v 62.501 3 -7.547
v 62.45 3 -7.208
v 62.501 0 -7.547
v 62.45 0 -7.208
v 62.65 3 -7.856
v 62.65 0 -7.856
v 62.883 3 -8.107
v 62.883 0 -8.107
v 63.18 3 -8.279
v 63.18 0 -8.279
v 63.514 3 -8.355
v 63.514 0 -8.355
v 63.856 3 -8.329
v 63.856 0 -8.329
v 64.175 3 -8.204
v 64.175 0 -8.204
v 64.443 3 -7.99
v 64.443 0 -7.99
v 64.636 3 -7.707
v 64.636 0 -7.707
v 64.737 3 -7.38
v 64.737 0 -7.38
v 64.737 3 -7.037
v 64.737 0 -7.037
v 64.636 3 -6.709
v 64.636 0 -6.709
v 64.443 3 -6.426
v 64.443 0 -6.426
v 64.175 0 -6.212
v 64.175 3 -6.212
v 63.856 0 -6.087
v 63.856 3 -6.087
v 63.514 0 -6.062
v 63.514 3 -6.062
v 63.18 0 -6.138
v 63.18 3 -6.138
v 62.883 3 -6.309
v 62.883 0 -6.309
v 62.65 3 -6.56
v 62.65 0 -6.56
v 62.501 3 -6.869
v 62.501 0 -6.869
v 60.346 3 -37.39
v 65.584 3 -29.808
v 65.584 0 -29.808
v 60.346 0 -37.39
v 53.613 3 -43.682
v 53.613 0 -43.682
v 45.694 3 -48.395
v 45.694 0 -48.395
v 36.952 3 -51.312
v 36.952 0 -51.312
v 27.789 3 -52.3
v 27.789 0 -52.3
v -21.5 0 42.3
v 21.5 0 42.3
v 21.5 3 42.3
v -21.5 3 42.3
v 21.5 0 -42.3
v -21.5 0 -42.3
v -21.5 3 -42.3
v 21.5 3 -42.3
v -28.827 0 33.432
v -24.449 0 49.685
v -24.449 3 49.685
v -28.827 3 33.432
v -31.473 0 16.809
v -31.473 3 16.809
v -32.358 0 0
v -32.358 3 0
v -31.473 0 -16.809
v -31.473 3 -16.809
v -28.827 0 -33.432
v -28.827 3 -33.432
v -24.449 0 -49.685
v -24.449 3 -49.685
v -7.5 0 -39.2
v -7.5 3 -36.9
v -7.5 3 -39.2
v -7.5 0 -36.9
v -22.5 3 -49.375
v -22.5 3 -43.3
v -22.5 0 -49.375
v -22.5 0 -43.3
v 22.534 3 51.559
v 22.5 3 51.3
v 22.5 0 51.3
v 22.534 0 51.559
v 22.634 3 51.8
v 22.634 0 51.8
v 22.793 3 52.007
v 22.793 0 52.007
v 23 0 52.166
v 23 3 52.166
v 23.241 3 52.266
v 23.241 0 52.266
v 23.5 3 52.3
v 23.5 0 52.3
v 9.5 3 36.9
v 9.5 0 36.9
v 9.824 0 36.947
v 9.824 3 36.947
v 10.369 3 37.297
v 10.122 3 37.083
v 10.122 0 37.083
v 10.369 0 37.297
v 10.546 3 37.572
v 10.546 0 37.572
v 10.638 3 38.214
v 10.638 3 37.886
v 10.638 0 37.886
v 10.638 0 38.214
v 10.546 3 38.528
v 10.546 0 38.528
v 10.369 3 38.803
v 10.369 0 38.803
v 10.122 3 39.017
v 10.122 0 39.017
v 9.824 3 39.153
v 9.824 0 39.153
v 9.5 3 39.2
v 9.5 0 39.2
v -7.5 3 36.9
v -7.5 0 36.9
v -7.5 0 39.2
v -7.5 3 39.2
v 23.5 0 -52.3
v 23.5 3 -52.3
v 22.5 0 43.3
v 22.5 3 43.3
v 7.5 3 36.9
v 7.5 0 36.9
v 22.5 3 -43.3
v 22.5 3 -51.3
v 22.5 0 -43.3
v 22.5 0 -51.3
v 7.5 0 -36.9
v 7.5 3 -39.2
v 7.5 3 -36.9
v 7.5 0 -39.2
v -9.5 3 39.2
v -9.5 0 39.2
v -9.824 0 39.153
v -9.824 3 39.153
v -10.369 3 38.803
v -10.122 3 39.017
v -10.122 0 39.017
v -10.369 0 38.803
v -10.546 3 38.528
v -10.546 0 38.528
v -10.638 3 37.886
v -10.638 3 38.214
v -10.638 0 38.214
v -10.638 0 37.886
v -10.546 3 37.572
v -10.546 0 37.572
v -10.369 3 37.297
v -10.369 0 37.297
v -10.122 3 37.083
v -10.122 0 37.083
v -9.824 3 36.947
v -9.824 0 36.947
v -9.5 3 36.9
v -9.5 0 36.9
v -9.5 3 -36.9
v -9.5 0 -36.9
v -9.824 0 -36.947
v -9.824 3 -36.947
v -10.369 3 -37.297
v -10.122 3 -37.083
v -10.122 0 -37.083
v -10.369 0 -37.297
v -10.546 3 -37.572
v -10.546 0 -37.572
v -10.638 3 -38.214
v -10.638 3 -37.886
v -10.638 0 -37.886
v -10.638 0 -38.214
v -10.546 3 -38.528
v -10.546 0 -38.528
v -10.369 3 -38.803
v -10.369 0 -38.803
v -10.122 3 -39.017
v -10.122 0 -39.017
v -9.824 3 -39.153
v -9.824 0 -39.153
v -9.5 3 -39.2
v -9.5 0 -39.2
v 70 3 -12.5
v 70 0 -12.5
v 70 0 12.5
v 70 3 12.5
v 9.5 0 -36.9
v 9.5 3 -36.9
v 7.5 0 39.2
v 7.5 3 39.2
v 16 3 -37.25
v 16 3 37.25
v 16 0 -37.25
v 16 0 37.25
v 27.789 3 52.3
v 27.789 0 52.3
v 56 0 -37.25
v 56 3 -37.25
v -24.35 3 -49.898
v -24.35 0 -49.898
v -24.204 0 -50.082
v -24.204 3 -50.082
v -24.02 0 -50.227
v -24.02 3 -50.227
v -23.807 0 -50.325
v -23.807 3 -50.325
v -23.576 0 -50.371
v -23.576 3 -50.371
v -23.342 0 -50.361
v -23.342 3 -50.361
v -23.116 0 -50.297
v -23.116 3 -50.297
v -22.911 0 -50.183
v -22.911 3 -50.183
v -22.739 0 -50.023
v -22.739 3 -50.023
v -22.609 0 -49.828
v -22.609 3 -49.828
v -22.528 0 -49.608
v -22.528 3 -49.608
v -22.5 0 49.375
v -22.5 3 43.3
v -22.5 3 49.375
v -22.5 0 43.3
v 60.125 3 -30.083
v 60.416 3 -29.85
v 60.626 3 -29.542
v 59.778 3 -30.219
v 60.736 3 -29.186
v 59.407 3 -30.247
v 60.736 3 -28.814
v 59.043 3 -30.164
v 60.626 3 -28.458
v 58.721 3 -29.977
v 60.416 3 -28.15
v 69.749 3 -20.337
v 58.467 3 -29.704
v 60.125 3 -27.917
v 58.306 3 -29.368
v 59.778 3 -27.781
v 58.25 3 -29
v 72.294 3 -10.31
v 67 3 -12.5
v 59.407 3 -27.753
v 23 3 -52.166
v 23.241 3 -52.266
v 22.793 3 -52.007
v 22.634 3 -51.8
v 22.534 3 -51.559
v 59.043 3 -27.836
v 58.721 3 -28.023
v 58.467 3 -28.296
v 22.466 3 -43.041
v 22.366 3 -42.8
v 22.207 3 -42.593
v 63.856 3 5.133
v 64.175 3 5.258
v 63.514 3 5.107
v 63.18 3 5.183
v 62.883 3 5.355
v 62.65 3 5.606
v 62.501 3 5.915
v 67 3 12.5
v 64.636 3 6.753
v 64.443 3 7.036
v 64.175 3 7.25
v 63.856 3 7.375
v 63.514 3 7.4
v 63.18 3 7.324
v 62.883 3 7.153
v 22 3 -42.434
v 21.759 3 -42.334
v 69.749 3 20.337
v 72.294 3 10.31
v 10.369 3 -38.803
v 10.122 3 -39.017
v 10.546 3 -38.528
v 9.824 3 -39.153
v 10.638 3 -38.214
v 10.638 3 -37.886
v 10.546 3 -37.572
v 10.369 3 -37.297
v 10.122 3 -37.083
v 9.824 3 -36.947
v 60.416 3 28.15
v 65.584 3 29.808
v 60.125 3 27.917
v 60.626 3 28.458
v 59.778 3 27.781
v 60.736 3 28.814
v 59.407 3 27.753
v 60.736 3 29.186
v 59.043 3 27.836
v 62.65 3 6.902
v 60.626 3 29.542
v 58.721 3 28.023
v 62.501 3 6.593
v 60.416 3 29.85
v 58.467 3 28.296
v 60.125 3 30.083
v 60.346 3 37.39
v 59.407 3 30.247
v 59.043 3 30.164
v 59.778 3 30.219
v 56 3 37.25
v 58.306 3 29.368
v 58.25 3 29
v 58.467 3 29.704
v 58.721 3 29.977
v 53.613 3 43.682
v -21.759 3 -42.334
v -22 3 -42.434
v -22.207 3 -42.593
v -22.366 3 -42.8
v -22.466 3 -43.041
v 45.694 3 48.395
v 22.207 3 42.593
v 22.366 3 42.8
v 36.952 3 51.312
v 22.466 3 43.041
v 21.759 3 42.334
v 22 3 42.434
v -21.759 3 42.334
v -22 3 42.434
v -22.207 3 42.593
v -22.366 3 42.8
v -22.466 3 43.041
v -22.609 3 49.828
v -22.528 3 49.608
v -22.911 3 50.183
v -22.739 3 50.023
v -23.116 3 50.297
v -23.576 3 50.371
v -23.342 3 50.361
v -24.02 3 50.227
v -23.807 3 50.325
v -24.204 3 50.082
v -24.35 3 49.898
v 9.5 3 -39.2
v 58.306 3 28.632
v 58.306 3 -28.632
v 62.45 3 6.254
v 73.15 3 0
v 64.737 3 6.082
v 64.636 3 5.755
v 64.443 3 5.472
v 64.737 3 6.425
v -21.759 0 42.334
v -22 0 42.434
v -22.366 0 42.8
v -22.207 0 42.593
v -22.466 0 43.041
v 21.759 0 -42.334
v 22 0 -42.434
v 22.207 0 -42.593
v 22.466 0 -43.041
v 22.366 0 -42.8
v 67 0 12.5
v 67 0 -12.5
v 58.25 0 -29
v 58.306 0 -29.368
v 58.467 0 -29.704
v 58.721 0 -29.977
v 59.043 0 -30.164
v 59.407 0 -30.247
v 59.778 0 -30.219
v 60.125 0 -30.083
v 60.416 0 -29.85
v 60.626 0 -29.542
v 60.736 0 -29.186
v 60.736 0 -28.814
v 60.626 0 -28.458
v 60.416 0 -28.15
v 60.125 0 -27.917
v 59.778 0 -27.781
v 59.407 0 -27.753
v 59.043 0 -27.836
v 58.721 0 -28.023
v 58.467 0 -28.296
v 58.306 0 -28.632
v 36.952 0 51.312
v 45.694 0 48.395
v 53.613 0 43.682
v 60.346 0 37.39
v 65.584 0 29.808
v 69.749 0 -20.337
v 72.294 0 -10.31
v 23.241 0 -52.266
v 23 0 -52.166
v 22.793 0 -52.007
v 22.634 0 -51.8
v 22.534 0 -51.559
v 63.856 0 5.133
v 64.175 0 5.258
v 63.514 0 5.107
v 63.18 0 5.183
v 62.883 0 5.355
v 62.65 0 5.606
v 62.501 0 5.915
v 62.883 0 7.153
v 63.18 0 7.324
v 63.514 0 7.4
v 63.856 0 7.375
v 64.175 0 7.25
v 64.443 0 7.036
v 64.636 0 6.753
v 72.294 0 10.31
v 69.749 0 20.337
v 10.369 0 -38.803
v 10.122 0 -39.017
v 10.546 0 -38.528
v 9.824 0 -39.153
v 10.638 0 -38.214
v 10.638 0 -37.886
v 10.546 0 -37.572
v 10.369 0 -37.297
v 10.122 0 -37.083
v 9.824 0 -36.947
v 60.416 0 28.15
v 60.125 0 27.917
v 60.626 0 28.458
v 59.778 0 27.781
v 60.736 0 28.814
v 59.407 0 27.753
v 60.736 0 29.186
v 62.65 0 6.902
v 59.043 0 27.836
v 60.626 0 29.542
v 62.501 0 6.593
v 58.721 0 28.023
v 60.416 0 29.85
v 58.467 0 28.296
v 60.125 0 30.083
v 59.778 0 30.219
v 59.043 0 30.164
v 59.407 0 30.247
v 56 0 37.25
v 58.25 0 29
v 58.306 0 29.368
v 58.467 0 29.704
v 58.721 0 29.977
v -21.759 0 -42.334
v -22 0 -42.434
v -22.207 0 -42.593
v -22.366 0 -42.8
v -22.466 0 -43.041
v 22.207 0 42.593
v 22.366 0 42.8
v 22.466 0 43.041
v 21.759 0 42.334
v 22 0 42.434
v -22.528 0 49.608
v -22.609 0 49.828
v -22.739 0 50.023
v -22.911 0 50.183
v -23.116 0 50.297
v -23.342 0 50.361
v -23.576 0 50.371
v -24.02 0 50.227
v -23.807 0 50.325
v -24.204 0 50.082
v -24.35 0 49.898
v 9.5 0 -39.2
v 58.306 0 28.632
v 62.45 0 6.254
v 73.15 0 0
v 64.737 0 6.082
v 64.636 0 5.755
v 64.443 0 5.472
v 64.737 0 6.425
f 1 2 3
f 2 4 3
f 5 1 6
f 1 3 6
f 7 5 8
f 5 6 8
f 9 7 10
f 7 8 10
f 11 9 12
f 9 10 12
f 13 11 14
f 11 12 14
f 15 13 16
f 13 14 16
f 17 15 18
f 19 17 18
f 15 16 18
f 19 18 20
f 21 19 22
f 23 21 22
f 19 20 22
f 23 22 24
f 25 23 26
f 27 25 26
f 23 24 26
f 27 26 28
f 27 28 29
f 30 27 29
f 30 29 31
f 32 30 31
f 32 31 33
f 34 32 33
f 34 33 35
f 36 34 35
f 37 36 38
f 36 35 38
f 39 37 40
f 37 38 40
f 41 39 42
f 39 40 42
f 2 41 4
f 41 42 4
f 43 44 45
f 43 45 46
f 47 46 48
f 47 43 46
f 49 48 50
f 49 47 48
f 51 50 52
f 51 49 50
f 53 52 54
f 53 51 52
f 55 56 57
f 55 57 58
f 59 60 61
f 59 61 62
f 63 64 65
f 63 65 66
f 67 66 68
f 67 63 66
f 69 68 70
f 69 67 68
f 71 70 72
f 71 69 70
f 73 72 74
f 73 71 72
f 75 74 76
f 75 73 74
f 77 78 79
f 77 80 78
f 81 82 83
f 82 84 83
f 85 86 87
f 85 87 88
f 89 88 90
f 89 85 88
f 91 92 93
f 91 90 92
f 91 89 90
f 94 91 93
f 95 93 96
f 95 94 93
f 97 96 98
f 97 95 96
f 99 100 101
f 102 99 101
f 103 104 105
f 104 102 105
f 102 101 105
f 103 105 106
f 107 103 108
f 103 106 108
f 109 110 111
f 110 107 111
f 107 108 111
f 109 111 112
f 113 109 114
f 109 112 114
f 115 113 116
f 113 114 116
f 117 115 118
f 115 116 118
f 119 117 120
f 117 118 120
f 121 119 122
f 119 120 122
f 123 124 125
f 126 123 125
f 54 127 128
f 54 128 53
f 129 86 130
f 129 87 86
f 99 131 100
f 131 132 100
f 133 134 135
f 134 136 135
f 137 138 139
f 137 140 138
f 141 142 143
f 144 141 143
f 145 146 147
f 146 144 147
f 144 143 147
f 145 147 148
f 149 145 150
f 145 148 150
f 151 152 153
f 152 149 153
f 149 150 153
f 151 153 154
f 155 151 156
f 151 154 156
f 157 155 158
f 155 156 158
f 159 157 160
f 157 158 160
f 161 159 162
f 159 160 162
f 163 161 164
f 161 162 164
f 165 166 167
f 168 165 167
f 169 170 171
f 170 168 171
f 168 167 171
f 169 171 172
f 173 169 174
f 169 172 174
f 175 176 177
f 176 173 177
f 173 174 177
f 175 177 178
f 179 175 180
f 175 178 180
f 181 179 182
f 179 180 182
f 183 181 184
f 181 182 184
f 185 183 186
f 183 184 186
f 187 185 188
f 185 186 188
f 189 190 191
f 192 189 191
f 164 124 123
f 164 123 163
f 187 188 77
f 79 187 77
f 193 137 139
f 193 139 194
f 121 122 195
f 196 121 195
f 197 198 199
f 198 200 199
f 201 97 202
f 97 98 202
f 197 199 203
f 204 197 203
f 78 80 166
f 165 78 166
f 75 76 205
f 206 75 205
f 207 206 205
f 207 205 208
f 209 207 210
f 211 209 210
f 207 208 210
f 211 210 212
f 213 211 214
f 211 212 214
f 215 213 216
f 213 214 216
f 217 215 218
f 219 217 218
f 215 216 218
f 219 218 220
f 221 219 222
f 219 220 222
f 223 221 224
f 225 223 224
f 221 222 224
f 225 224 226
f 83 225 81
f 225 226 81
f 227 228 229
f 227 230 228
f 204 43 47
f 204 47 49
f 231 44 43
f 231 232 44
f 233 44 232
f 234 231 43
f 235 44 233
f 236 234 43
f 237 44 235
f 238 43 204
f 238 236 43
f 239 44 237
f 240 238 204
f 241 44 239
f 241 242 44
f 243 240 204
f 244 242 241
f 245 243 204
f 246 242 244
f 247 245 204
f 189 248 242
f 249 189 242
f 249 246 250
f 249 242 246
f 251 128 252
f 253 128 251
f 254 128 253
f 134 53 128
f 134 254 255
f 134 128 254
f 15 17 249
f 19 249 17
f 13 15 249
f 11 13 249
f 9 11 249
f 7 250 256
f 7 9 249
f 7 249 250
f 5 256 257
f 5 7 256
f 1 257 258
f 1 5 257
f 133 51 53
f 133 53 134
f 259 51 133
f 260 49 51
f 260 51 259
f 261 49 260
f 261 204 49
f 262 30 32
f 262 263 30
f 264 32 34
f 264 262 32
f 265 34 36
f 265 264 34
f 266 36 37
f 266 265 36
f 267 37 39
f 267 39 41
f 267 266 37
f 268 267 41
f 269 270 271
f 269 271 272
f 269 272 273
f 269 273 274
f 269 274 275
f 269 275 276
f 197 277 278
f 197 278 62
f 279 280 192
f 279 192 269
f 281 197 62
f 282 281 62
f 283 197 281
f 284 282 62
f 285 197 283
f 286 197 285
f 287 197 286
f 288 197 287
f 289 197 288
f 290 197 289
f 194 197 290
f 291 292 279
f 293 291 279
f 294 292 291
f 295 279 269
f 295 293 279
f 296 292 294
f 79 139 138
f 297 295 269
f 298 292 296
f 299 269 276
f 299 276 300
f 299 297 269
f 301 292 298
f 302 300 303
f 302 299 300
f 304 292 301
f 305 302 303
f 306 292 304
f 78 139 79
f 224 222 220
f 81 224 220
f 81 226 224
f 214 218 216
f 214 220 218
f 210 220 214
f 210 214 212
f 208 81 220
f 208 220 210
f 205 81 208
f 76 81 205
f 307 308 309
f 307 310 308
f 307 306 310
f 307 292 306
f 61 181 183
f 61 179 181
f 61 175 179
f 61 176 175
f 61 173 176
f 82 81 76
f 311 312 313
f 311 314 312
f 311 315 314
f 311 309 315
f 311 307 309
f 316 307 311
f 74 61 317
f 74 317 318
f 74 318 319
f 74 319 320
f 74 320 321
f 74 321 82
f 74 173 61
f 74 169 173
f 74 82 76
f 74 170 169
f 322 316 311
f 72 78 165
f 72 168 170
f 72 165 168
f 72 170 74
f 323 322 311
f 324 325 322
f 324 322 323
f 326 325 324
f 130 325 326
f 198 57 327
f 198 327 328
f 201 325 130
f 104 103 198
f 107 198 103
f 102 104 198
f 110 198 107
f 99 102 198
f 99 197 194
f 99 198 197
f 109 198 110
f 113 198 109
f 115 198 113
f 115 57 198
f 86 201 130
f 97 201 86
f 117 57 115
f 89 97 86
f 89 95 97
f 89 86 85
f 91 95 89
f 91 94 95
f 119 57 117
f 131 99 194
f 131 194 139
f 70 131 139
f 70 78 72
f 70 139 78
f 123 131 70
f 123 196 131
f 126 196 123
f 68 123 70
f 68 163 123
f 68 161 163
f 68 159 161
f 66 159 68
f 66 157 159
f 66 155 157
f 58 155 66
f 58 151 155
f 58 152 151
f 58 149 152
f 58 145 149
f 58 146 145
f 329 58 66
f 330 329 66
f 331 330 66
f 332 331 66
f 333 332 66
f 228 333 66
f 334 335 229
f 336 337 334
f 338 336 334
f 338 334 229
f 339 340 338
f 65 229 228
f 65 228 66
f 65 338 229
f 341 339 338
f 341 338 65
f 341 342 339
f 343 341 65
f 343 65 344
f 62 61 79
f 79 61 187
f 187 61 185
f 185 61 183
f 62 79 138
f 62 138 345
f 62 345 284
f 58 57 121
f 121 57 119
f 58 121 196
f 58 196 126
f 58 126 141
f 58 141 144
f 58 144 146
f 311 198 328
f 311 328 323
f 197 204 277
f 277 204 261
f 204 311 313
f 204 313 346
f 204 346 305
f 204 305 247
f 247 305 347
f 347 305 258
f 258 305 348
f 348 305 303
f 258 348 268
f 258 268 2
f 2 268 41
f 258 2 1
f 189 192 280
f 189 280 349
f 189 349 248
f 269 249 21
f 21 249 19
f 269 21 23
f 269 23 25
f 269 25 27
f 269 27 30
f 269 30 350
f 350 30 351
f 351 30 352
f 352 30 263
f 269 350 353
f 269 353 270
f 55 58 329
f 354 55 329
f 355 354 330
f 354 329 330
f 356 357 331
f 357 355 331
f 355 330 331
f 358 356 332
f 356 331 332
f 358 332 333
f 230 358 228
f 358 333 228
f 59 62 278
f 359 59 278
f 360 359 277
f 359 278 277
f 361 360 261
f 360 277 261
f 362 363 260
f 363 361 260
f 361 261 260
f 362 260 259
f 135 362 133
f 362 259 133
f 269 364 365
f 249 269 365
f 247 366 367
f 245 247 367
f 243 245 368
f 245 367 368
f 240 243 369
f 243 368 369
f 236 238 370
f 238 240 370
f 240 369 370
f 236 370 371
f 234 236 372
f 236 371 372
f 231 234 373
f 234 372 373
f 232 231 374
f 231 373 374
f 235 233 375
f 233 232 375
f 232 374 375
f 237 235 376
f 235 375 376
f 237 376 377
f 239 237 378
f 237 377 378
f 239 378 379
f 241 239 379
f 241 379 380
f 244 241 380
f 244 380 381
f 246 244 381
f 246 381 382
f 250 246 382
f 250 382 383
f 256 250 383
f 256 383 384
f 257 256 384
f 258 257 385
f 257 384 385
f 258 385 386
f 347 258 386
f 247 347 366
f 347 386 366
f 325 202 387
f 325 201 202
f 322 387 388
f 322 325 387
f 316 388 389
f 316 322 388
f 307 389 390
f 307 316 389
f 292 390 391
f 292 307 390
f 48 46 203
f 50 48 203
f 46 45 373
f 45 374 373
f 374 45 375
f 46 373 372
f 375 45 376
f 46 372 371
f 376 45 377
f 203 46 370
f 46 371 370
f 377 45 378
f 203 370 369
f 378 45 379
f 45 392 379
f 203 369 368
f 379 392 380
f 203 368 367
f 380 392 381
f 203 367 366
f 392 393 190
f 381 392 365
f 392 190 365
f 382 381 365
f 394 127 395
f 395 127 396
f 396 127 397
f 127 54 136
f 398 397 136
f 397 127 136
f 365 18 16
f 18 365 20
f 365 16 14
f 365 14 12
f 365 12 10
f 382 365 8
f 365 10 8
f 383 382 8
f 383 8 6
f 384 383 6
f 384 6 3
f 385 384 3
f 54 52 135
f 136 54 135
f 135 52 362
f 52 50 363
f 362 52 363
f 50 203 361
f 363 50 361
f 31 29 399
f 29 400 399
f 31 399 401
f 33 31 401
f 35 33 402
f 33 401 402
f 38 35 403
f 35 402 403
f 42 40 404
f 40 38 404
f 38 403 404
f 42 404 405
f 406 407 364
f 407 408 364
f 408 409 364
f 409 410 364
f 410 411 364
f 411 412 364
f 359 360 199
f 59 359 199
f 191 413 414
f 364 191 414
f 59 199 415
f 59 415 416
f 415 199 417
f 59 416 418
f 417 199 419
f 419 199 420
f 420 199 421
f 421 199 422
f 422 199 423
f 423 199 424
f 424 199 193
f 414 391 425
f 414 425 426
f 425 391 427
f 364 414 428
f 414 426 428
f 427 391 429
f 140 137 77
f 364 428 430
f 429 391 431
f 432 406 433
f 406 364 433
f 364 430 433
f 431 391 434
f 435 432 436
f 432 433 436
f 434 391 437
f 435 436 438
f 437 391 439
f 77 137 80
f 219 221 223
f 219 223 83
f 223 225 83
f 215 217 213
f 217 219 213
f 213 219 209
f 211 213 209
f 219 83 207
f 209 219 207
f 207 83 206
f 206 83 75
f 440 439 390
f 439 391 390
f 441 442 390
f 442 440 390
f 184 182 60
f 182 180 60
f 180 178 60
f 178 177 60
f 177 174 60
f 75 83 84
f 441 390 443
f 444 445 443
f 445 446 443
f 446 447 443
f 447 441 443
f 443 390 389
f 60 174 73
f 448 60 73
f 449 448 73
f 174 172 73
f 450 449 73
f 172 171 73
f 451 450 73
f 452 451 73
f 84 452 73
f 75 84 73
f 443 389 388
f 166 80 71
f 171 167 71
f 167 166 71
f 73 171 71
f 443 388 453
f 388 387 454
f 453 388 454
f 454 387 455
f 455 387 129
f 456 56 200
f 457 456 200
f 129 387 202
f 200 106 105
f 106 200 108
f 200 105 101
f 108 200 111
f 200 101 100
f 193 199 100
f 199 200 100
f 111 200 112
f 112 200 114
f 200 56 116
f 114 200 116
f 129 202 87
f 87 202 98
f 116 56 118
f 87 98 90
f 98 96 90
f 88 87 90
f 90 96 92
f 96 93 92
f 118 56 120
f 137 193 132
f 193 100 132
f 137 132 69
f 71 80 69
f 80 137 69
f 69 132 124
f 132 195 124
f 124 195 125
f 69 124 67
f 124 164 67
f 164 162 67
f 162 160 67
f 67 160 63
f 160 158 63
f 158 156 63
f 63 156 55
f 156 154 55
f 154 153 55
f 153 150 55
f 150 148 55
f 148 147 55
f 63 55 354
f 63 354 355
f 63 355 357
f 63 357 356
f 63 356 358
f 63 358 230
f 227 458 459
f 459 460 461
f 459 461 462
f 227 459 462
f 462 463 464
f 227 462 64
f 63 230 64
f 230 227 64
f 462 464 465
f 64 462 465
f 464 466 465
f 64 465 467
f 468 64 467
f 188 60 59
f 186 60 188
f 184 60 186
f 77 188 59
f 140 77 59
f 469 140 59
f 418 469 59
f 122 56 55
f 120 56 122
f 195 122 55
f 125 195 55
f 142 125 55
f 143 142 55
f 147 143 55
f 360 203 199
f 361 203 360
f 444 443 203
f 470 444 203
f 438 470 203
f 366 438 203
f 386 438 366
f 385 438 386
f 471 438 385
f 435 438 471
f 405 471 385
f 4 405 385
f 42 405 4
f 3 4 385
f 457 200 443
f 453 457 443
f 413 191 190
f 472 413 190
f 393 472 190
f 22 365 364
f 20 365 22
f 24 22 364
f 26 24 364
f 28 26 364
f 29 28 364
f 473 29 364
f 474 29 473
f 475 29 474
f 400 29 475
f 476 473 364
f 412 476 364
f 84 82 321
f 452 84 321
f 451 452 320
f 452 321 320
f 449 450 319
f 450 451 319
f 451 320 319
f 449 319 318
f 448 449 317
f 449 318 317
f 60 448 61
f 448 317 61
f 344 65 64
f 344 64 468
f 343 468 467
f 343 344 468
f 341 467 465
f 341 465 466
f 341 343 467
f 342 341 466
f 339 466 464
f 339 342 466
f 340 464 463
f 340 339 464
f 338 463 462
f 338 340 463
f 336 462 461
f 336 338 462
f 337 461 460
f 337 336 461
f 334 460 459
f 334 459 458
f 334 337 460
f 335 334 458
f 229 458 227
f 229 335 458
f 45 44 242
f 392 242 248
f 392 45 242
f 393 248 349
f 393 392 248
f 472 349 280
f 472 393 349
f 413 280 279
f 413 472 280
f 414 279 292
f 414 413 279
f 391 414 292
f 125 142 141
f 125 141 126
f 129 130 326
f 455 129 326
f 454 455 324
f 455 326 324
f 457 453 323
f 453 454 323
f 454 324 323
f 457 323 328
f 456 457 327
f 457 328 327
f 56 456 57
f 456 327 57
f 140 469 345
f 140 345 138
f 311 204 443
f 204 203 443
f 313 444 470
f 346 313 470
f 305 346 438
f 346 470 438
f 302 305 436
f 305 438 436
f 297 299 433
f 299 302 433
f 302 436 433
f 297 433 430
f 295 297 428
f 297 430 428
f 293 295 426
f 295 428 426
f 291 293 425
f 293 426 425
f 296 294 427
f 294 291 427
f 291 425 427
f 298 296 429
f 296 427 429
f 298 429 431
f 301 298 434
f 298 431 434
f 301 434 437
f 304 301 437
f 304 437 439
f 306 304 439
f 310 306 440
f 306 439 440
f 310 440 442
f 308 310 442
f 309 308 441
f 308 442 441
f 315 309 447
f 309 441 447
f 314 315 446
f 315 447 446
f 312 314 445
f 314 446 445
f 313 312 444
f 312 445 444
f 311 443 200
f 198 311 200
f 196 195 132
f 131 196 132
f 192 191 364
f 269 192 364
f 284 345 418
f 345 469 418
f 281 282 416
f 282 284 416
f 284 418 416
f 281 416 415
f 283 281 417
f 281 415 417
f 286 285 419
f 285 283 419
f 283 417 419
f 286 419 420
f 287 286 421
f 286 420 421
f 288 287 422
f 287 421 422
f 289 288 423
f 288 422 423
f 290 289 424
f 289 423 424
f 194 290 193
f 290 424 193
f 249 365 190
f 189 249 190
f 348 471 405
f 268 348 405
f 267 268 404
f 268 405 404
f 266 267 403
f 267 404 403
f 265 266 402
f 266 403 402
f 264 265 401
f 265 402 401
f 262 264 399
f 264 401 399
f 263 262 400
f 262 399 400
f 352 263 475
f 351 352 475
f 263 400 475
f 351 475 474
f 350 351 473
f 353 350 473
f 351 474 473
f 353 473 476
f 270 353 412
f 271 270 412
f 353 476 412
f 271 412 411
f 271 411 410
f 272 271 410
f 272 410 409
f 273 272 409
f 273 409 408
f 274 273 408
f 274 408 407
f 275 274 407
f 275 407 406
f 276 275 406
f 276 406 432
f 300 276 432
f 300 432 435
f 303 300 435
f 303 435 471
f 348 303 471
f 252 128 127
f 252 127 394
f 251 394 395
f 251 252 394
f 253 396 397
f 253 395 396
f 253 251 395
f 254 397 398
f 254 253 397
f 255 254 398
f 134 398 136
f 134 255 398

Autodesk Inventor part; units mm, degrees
ref_plane "YZ Plane" through (0, 0, 0) normal (1, 0, 0) x (0, 1, 0)
ref_plane "XZ Plane" through (0, 0, 0) normal (0, 1, 0) x (-1, 0, 0)
ref_plane "XY Plane" through (0, 0, 0) normal (0, 0, 1) x (1, 0, 0)
sketch "Boceto2" plane through (0, 0, 0) normal (0, 1, 0) x (-1, 0, 0)
  circle A0 centre (-10.65, 0) radius 62.5
  line L0 (-63, 32.5) -> (-63, -32.5)
  line L1 (-63, -32.5) -> (-33, -32.5)
  line L2 (-33, -32.5) -> (-33, 32.5)
  line L3 (-33, 32.5) -> (-63, 32.5)
  circle A1 centre (-59.5, -29) radius 1.25
  line L4 (0, 6.809) -> (0, -6.809)
  line L5 (10.65, 0) -> (-10.65, 0) construction
  circle A2 centre (-36.5, -29) radius 1.25
  circle A3 centre (-59.5, 29) radius 1.25
  circle A4 centre (-36.5, 29) radius 1.25
  line L6 (7.5, -42.3) -> (-7.5, -42.3)
  line L7 (-7.5, -42.3) -> (-7.5, -25)
  line L8 (-7.5, -25) -> (7.5, -25)
  line L9 (7.5, -25) -> (7.5, -42.3)
  arc A5 (9, -42.3) -> (9, -33.8) centre (9, -38.05) ccw
  line L10 (9, -42.3) -> (7.5, -42.3)
  line L11 (9, -33.8) -> (7.5, -33.8)
  arc A6 (9.5, -39.2) -> (9.5, -36.9) centre (9.5, -38.05) ccw
  line L12 (9.5, -39.2) -> (7.5, -39.2)
  line L13 (7.5, -39.2) -> (7.5, -36.9)
  line L14 (7.5, -36.9) -> (9.5, -36.9)
  line L15 (9.5, -36.9) -> (9.5, -39.2)
  arc A7 (-9, -33.8) -> (-9, -42.3) centre (-9, -38.05) ccw
  line L16 (-9, -42.3) -> (-7.5, -42.3)
  line L17 (-9, -33.8) -> (-7.5, -33.8)
  arc A8 (-9.5, -36.9) -> (-9.5, -39.2) centre (-9.5, -38.05) ccw
  line L18 (-9.5, -39.2) -> (-7.5, -39.2)
  line L19 (-7.5, -39.2) -> (-7.5, -36.9)
  line L20 (-7.5, -36.9) -> (-9.5, -36.9)
  line L21 (-9.5, -36.9) -> (-9.5, -39.2)
  line L22 (7.5, 42.3) -> (-7.5, 42.3)
  line L23 (-7.5, 42.3) -> (-7.5, 25)
  line L24 (-7.5, 25) -> (7.5, 25)
  line L25 (7.5, 25) -> (7.5, 42.3)
  arc A9 (9, 33.8) -> (9, 42.3) centre (9, 38.05) ccw
  line L26 (9, 42.3) -> (7.5, 42.3)
  line L27 (9, 33.8) -> (7.5, 33.8)
  arc A10 (9.5, 36.9) -> (9.5, 39.2) centre (9.5, 38.05) ccw
  line L28 (9.5, 39.2) -> (7.5, 39.2)
  line L29 (7.5, 39.2) -> (7.5, 36.9)
  line L30 (7.5, 36.9) -> (9.5, 36.9)
  line L31 (9.5, 36.9) -> (9.5, 39.2)
  line L32 (-9, 33.8) -> (-7.5, 33.8)
  line L33 (-7.5, 36.9) -> (-9.5, 36.9)
  line L34 (-7.5, 39.2) -> (-7.5, 36.9)
  line L35 (-9.5, 36.9) -> (-9.5, 39.2)
  line L36 (-9.5, 39.2) -> (-7.5, 39.2)
  arc A11 (-9.5, 39.2) -> (-9.5, 36.9) centre (-9.5, 38.05) ccw
  line L37 (-9, 42.3) -> (-7.5, 42.3)
  arc A12 (-9, 42.3) -> (-9, 33.8) centre (-9, 38.05) ccw
  line L38 (-16, -37.25) -> (-56, -37.25)
  line L39 (-56, -37.25) -> (-56, 37.25)
  line L40 (-56, 37.25) -> (-16, 37.25)
  line L41 (-16, 37.25) -> (-16, -37.25)
  line L42 (20.3604, -4.25) -> (0.1604, -4.25)
  line L43 (0.1604, -4.25) -> (0.1604, 4.25)
  line L44 (0.1604, 4.25) -> (20.3604, 4.25)
  line L45 (20.3604, 4.25) -> (20.3604, -4.25)
  line L46 (35.3604, -42.3) -> (-56.6604, -42.3)
  line L47 (-56.6604, -42.3) -> (-56.6604, 42.3)
  line L48 (-56.6604, 42.3) -> (35.3604, 42.3)
  line L49 (35.3604, 42.3) -> (35.3604, -42.3)
  line L50 (-67, -12.5) -> (-70, -12.5)
  line L51 (-70, -12.5) -> (-70, 12.5)
  line L52 (-70, 12.5) -> (-67, 12.5)
  line L53 (-67, 12.5) -> (-67, -12.5)
  line L54 (-19.3, -12.5) -> (-32, -12.5) construction
  line L55 (-32, -12.5) -> (-32, 7.82) construction
  line L56 (-32, 7.82) -> (-19.3, 7.82) construction
  line L57 (-19.3, 7.82) -> (-19.3, -12.5) construction
  line L58 (22.5, 52.3) -> (-22.5, 52.3)
  line L59 (-22.5, 52.3) -> (-22.5, 42.3)
  line L60 (-22.5, 42.3) -> (22.5, 42.3)
  line L61 (22.5, 42.3) -> (22.5, 52.3)
  line L62 (22.5, -52.3) -> (-22.5, -52.3)
  line L63 (-22.5, -52.3) -> (-22.5, -42.3)
  line L64 (-22.5, -42.3) -> (22.5, -42.3)
  line L65 (22.5, -42.3) -> (22.5, -52.3)
  line L66 (22.5, 52.3) -> (23.5693, 52.3)
  line L67 (-22.5, 52.3) -> (-44.8693, 52.3)
  line L68 (22.5, -52.3) -> (23.5693, -52.3)
  line L69 (-22.5, -52.3) -> (-44.8693, -52.3)
  circle A13 centre (-63.6, 6.2537) radius 1.15
  circle A14 centre (-63.6, -7.2083) radius 1.15
  arc A15 (23.5693, -52.3) -> (23.5693, 52.3) centre (-127.6415, 0) ccw
  point P0 (0, 0)
  point P1 (-33, 0)
  point P2 (0, 0)
  point P3 (13.25, -38.05)
  point P4 (10.65, -38.05)
  point P5 (-13.25, -38.05)
  point P6 (-10.65, -38.05)
  point P7 (13.25, 38.05)
  point P8 (10.65, 38.05)
  point P9 (-10.65, 38.05)
  point P10 (-13.25, 38.05)
  point P11 (-16, 0)
  point P12 (20.3604, 0)
  point P13 (-67, 0)
  point P14 (-56.6604, -42.3)
  point P15 (9, 42.3)
  point P16 (47.2734, 42.3)
  point P17 (0, 52.3)
  point P18 (-22.5, -42.3)
  point P19 (22.5, -42.3)
  point P20 (22.5, 42.3)
  dimension "d128" = 125
  dimension "d52" = 65
  dimension "d53" = 30
  dimension "d56" = 3.5
  dimension "d57" = 3.5
  dimension "d60" = 23
  dimension "d63" = 58
  dimension "d78" = 15
  dimension "d79" = 17.3
  dimension "d80" = 8.5
  dimension "d81" = 1.5
  dimension "d82" = 4.25
  dimension "d83" = 1.15
  dimension "d84" = 2.3
  dimension "d86" = 2
  dimension "d87" = 25
  dimension "d88" = 7.5
  dimension "d89" = 40
  dimension "d90" = 74.5
  dimension "d91" = 16
  dimension "d92" = 20.2
  dimension "d93" = 8.5
  dimension "d94" = 3
  dimension "d95" = 25
  dimension "d98" = 11
  dimension "d99" = 12.7
  dimension "d100" = 20.32
  dimension "d101" = 1
  dimension "d102" = 20
  dimension "d108" = 10
  dimension "d113" = 45
  dimension "d114" = 13.462
  dimension "d115" = 3.4
  dimension "d116" = 2.3
  dimension "d119" = 2.3
  dimension "d120" = 33
  dimension "d122" = 160
  dimension "d127" = 15
  dimension "d133" = 10.65
extrude "Extrusión4" add sketch "Boceto2" along normal blind 3 contours A0 L49 | L48 A15 A0 | L49 L46 A15 L48 | A0 A15 L46 | L66 L58 L67 A0 | A15 L48 L61 L66 | A15 L46 A5 L11 L9 L8 L7 L17 A7 L47 L1 L39 L38 L41 L40 L3 L48 A12 L32 L23 L24 L25 L27 A9 | A0 L69 L62 L68 | L68 L65 L46 A15 | L67 L59 L48 A0 | L61 L48 L26 L22 L37 L59 L58 | A0 L46 L63 L69 | L62 L63 L46 L16 L6 L10 L65 | L47 L3 L0 A13 A14 L1 A0 | A9 L27 L25 L30 A10 L28 L26 | L10 L9 L12 A6 L14 L11 A5 | L47 L1 L0 A14 A13 L3 | L3 L39 L1 L47 | L25 L24 L23 L22 | L6 L7 L8 L9 | L39 L40 L41 L38 L1 L2 L3 | L3 L2 L1 L39 | L37 L23 L36 A11 L33 L32 A12 | L28 L31 L30 L25 | A7 L17 L7 L20 A8 L18 L16 | L9 L14 L15 L12 | A13 L0 | L0 A13 | L23 L33 L35 L36 | A10 L31 | A14 L0 | L0 A14 | L18 L21 L20 L7 | L15 A6 | L35 A11 | A8 L21 | A1 | A2 | A3 | A4 | L42 L43 L44 L45 | L50 L51 L52 L53
extrude "Extrusión9" cut sketch "Boceto2" along normal blind 3 contours A0 L49 | L48 A15 A0 | L49 L46 A15 L48 | A0 A15 L46 | L66 L58 L67 A0 | A0 L69 L62 L68 | L61 L48 L26 L22 L37 L59 L58 | L62 L63 L46 L16 L6 L10 L65 | L39 L40 L41 L38 L1 L2 L3 | L3 L2 L1 L39 | L28 L31 L30 L25 | L9 L14 L15 L12 | A13 L0 | L0 A13 | L23 L33 L35 L36 | A10 L31 | A14 L0 | L0 A14 | L18 L21 L20 L7 | L15 A6 | L35 A11 | A8 L21 | A1 | A2 | A3 | A4 | L50 L51 L52 L53
fillet "Empalme6" radius 1 10 edges at (-23.5693, 1.5, 52.3) (-22.5, 1.5, 52.3) (-23.5693, 1.5, -52.3) (-22.5, 1.5, -52.3) (22.5, 1.5, -52.3) (22.5, 1.5, 52.3) (22.5, 1.5, -42.3) (-22.5, 1.5, -42.3) (-22.5, 1.5, 42.3) (22.5, 1.5, 42.3)
fillet "Empalme7" radius 43 2 edges at (44.8693, 1.5, 52.3) (44.8693, 1.5, -52.3)
properties part number "Parte inferior 2 v2" material "Madera (nogal)"
